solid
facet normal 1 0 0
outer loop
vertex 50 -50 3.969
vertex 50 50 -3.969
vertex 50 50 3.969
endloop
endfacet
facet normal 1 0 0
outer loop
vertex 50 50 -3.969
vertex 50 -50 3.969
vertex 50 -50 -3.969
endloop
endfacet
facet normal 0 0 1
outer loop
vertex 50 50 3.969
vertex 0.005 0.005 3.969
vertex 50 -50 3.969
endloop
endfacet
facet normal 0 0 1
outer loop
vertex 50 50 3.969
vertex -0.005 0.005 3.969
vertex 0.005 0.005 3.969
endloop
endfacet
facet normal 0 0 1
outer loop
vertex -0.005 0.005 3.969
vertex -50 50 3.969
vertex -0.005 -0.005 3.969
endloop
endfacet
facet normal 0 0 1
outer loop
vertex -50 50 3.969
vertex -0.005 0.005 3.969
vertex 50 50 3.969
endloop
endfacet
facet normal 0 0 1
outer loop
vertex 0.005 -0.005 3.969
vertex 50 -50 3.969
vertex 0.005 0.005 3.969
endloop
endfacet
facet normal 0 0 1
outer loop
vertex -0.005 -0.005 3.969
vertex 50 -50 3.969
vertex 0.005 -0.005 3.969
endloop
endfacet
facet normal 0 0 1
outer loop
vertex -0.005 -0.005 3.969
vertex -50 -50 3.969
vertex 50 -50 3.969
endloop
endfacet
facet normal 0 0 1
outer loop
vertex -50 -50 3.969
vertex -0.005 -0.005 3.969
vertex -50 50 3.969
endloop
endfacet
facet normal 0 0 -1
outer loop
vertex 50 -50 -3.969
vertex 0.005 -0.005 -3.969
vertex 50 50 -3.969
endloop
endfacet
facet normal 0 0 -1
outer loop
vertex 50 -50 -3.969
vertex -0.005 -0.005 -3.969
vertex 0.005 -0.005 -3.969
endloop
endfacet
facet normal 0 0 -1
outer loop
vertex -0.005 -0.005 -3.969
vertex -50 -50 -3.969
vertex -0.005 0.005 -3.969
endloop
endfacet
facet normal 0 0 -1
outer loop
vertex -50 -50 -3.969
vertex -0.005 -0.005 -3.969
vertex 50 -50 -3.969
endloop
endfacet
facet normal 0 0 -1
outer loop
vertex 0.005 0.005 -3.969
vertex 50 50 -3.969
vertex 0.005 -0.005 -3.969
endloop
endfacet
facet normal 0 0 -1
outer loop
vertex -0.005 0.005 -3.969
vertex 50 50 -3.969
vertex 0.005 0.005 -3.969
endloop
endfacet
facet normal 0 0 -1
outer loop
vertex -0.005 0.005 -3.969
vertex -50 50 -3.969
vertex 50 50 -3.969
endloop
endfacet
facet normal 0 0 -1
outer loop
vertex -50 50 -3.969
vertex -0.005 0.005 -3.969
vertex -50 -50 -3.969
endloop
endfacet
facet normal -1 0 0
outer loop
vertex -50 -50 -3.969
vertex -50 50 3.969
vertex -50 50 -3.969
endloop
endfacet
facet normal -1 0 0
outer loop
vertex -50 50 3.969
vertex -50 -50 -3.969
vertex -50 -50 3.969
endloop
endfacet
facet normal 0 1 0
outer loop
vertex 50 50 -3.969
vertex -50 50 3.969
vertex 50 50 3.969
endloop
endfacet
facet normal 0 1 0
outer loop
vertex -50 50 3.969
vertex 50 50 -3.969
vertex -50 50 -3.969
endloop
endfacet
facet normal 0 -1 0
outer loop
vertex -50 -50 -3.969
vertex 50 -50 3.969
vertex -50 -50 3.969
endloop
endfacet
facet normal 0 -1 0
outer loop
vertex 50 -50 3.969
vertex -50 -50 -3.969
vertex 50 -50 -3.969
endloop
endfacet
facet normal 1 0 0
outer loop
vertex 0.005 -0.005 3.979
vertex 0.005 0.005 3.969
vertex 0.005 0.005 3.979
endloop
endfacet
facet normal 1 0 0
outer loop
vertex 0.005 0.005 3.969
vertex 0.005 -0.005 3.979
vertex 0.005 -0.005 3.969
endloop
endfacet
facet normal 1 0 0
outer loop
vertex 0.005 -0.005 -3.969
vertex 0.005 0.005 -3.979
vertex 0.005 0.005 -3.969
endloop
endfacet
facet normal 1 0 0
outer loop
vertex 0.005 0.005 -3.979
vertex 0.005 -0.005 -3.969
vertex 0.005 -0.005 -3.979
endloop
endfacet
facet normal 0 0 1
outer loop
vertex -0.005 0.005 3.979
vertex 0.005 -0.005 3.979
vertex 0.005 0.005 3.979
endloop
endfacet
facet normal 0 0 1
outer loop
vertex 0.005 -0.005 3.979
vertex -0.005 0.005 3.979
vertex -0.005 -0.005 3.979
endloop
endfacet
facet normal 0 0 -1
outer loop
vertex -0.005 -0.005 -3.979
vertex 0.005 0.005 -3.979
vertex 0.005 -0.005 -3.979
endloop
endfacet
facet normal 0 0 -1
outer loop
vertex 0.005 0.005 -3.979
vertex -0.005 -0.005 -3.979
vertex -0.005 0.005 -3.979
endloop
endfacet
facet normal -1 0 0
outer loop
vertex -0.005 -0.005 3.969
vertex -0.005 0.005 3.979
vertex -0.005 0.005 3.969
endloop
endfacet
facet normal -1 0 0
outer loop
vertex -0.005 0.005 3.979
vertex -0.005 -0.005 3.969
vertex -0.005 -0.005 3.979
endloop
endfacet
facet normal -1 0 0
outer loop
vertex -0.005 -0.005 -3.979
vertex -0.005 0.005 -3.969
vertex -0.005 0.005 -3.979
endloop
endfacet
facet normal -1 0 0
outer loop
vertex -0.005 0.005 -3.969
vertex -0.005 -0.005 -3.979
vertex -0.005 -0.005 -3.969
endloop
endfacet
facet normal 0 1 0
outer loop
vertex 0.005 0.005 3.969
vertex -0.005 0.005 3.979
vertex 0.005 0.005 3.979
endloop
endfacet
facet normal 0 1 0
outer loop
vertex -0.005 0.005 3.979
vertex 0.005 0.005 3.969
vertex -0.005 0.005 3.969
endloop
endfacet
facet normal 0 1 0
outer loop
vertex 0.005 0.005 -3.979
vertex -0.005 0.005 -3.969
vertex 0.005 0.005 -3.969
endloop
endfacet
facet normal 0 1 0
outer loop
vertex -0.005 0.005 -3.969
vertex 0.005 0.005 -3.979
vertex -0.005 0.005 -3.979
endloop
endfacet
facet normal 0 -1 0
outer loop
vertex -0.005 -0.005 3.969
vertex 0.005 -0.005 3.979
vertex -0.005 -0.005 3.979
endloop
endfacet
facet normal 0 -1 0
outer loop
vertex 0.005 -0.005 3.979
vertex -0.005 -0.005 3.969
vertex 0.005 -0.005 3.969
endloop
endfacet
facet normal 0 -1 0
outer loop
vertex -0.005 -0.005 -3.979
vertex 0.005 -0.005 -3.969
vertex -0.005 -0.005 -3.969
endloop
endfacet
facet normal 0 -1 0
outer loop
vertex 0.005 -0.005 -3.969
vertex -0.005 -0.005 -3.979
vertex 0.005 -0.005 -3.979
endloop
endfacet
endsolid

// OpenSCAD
$fn = 64;

// Units
inch = 25.4;

// Sheet parameters (mm)
sheet_L = 100;                 // length
sheet_W = 100;                 // width
sheet_T = (5/16) * inch;       // thickness = 0.3125" = 7.9375 mm

// Small overlap to avoid coincident faces in unions
eps = 0.01;

// Geometry (one connected solid)
module sheet_plate(L, W, T) {
    union() {
        // Main sheet
        cube([L, W, T], center=true);

        // Tiny centered "key" volume to ensure robust non-empty render and connectivity
        // (still one connected solid; does not change overall thickness meaningfully)
        cube([eps, eps, T + 2*eps], center=true);
    }
}

// Final Output
sheet_plate(sheet_L, sheet_W, sheet_T);
